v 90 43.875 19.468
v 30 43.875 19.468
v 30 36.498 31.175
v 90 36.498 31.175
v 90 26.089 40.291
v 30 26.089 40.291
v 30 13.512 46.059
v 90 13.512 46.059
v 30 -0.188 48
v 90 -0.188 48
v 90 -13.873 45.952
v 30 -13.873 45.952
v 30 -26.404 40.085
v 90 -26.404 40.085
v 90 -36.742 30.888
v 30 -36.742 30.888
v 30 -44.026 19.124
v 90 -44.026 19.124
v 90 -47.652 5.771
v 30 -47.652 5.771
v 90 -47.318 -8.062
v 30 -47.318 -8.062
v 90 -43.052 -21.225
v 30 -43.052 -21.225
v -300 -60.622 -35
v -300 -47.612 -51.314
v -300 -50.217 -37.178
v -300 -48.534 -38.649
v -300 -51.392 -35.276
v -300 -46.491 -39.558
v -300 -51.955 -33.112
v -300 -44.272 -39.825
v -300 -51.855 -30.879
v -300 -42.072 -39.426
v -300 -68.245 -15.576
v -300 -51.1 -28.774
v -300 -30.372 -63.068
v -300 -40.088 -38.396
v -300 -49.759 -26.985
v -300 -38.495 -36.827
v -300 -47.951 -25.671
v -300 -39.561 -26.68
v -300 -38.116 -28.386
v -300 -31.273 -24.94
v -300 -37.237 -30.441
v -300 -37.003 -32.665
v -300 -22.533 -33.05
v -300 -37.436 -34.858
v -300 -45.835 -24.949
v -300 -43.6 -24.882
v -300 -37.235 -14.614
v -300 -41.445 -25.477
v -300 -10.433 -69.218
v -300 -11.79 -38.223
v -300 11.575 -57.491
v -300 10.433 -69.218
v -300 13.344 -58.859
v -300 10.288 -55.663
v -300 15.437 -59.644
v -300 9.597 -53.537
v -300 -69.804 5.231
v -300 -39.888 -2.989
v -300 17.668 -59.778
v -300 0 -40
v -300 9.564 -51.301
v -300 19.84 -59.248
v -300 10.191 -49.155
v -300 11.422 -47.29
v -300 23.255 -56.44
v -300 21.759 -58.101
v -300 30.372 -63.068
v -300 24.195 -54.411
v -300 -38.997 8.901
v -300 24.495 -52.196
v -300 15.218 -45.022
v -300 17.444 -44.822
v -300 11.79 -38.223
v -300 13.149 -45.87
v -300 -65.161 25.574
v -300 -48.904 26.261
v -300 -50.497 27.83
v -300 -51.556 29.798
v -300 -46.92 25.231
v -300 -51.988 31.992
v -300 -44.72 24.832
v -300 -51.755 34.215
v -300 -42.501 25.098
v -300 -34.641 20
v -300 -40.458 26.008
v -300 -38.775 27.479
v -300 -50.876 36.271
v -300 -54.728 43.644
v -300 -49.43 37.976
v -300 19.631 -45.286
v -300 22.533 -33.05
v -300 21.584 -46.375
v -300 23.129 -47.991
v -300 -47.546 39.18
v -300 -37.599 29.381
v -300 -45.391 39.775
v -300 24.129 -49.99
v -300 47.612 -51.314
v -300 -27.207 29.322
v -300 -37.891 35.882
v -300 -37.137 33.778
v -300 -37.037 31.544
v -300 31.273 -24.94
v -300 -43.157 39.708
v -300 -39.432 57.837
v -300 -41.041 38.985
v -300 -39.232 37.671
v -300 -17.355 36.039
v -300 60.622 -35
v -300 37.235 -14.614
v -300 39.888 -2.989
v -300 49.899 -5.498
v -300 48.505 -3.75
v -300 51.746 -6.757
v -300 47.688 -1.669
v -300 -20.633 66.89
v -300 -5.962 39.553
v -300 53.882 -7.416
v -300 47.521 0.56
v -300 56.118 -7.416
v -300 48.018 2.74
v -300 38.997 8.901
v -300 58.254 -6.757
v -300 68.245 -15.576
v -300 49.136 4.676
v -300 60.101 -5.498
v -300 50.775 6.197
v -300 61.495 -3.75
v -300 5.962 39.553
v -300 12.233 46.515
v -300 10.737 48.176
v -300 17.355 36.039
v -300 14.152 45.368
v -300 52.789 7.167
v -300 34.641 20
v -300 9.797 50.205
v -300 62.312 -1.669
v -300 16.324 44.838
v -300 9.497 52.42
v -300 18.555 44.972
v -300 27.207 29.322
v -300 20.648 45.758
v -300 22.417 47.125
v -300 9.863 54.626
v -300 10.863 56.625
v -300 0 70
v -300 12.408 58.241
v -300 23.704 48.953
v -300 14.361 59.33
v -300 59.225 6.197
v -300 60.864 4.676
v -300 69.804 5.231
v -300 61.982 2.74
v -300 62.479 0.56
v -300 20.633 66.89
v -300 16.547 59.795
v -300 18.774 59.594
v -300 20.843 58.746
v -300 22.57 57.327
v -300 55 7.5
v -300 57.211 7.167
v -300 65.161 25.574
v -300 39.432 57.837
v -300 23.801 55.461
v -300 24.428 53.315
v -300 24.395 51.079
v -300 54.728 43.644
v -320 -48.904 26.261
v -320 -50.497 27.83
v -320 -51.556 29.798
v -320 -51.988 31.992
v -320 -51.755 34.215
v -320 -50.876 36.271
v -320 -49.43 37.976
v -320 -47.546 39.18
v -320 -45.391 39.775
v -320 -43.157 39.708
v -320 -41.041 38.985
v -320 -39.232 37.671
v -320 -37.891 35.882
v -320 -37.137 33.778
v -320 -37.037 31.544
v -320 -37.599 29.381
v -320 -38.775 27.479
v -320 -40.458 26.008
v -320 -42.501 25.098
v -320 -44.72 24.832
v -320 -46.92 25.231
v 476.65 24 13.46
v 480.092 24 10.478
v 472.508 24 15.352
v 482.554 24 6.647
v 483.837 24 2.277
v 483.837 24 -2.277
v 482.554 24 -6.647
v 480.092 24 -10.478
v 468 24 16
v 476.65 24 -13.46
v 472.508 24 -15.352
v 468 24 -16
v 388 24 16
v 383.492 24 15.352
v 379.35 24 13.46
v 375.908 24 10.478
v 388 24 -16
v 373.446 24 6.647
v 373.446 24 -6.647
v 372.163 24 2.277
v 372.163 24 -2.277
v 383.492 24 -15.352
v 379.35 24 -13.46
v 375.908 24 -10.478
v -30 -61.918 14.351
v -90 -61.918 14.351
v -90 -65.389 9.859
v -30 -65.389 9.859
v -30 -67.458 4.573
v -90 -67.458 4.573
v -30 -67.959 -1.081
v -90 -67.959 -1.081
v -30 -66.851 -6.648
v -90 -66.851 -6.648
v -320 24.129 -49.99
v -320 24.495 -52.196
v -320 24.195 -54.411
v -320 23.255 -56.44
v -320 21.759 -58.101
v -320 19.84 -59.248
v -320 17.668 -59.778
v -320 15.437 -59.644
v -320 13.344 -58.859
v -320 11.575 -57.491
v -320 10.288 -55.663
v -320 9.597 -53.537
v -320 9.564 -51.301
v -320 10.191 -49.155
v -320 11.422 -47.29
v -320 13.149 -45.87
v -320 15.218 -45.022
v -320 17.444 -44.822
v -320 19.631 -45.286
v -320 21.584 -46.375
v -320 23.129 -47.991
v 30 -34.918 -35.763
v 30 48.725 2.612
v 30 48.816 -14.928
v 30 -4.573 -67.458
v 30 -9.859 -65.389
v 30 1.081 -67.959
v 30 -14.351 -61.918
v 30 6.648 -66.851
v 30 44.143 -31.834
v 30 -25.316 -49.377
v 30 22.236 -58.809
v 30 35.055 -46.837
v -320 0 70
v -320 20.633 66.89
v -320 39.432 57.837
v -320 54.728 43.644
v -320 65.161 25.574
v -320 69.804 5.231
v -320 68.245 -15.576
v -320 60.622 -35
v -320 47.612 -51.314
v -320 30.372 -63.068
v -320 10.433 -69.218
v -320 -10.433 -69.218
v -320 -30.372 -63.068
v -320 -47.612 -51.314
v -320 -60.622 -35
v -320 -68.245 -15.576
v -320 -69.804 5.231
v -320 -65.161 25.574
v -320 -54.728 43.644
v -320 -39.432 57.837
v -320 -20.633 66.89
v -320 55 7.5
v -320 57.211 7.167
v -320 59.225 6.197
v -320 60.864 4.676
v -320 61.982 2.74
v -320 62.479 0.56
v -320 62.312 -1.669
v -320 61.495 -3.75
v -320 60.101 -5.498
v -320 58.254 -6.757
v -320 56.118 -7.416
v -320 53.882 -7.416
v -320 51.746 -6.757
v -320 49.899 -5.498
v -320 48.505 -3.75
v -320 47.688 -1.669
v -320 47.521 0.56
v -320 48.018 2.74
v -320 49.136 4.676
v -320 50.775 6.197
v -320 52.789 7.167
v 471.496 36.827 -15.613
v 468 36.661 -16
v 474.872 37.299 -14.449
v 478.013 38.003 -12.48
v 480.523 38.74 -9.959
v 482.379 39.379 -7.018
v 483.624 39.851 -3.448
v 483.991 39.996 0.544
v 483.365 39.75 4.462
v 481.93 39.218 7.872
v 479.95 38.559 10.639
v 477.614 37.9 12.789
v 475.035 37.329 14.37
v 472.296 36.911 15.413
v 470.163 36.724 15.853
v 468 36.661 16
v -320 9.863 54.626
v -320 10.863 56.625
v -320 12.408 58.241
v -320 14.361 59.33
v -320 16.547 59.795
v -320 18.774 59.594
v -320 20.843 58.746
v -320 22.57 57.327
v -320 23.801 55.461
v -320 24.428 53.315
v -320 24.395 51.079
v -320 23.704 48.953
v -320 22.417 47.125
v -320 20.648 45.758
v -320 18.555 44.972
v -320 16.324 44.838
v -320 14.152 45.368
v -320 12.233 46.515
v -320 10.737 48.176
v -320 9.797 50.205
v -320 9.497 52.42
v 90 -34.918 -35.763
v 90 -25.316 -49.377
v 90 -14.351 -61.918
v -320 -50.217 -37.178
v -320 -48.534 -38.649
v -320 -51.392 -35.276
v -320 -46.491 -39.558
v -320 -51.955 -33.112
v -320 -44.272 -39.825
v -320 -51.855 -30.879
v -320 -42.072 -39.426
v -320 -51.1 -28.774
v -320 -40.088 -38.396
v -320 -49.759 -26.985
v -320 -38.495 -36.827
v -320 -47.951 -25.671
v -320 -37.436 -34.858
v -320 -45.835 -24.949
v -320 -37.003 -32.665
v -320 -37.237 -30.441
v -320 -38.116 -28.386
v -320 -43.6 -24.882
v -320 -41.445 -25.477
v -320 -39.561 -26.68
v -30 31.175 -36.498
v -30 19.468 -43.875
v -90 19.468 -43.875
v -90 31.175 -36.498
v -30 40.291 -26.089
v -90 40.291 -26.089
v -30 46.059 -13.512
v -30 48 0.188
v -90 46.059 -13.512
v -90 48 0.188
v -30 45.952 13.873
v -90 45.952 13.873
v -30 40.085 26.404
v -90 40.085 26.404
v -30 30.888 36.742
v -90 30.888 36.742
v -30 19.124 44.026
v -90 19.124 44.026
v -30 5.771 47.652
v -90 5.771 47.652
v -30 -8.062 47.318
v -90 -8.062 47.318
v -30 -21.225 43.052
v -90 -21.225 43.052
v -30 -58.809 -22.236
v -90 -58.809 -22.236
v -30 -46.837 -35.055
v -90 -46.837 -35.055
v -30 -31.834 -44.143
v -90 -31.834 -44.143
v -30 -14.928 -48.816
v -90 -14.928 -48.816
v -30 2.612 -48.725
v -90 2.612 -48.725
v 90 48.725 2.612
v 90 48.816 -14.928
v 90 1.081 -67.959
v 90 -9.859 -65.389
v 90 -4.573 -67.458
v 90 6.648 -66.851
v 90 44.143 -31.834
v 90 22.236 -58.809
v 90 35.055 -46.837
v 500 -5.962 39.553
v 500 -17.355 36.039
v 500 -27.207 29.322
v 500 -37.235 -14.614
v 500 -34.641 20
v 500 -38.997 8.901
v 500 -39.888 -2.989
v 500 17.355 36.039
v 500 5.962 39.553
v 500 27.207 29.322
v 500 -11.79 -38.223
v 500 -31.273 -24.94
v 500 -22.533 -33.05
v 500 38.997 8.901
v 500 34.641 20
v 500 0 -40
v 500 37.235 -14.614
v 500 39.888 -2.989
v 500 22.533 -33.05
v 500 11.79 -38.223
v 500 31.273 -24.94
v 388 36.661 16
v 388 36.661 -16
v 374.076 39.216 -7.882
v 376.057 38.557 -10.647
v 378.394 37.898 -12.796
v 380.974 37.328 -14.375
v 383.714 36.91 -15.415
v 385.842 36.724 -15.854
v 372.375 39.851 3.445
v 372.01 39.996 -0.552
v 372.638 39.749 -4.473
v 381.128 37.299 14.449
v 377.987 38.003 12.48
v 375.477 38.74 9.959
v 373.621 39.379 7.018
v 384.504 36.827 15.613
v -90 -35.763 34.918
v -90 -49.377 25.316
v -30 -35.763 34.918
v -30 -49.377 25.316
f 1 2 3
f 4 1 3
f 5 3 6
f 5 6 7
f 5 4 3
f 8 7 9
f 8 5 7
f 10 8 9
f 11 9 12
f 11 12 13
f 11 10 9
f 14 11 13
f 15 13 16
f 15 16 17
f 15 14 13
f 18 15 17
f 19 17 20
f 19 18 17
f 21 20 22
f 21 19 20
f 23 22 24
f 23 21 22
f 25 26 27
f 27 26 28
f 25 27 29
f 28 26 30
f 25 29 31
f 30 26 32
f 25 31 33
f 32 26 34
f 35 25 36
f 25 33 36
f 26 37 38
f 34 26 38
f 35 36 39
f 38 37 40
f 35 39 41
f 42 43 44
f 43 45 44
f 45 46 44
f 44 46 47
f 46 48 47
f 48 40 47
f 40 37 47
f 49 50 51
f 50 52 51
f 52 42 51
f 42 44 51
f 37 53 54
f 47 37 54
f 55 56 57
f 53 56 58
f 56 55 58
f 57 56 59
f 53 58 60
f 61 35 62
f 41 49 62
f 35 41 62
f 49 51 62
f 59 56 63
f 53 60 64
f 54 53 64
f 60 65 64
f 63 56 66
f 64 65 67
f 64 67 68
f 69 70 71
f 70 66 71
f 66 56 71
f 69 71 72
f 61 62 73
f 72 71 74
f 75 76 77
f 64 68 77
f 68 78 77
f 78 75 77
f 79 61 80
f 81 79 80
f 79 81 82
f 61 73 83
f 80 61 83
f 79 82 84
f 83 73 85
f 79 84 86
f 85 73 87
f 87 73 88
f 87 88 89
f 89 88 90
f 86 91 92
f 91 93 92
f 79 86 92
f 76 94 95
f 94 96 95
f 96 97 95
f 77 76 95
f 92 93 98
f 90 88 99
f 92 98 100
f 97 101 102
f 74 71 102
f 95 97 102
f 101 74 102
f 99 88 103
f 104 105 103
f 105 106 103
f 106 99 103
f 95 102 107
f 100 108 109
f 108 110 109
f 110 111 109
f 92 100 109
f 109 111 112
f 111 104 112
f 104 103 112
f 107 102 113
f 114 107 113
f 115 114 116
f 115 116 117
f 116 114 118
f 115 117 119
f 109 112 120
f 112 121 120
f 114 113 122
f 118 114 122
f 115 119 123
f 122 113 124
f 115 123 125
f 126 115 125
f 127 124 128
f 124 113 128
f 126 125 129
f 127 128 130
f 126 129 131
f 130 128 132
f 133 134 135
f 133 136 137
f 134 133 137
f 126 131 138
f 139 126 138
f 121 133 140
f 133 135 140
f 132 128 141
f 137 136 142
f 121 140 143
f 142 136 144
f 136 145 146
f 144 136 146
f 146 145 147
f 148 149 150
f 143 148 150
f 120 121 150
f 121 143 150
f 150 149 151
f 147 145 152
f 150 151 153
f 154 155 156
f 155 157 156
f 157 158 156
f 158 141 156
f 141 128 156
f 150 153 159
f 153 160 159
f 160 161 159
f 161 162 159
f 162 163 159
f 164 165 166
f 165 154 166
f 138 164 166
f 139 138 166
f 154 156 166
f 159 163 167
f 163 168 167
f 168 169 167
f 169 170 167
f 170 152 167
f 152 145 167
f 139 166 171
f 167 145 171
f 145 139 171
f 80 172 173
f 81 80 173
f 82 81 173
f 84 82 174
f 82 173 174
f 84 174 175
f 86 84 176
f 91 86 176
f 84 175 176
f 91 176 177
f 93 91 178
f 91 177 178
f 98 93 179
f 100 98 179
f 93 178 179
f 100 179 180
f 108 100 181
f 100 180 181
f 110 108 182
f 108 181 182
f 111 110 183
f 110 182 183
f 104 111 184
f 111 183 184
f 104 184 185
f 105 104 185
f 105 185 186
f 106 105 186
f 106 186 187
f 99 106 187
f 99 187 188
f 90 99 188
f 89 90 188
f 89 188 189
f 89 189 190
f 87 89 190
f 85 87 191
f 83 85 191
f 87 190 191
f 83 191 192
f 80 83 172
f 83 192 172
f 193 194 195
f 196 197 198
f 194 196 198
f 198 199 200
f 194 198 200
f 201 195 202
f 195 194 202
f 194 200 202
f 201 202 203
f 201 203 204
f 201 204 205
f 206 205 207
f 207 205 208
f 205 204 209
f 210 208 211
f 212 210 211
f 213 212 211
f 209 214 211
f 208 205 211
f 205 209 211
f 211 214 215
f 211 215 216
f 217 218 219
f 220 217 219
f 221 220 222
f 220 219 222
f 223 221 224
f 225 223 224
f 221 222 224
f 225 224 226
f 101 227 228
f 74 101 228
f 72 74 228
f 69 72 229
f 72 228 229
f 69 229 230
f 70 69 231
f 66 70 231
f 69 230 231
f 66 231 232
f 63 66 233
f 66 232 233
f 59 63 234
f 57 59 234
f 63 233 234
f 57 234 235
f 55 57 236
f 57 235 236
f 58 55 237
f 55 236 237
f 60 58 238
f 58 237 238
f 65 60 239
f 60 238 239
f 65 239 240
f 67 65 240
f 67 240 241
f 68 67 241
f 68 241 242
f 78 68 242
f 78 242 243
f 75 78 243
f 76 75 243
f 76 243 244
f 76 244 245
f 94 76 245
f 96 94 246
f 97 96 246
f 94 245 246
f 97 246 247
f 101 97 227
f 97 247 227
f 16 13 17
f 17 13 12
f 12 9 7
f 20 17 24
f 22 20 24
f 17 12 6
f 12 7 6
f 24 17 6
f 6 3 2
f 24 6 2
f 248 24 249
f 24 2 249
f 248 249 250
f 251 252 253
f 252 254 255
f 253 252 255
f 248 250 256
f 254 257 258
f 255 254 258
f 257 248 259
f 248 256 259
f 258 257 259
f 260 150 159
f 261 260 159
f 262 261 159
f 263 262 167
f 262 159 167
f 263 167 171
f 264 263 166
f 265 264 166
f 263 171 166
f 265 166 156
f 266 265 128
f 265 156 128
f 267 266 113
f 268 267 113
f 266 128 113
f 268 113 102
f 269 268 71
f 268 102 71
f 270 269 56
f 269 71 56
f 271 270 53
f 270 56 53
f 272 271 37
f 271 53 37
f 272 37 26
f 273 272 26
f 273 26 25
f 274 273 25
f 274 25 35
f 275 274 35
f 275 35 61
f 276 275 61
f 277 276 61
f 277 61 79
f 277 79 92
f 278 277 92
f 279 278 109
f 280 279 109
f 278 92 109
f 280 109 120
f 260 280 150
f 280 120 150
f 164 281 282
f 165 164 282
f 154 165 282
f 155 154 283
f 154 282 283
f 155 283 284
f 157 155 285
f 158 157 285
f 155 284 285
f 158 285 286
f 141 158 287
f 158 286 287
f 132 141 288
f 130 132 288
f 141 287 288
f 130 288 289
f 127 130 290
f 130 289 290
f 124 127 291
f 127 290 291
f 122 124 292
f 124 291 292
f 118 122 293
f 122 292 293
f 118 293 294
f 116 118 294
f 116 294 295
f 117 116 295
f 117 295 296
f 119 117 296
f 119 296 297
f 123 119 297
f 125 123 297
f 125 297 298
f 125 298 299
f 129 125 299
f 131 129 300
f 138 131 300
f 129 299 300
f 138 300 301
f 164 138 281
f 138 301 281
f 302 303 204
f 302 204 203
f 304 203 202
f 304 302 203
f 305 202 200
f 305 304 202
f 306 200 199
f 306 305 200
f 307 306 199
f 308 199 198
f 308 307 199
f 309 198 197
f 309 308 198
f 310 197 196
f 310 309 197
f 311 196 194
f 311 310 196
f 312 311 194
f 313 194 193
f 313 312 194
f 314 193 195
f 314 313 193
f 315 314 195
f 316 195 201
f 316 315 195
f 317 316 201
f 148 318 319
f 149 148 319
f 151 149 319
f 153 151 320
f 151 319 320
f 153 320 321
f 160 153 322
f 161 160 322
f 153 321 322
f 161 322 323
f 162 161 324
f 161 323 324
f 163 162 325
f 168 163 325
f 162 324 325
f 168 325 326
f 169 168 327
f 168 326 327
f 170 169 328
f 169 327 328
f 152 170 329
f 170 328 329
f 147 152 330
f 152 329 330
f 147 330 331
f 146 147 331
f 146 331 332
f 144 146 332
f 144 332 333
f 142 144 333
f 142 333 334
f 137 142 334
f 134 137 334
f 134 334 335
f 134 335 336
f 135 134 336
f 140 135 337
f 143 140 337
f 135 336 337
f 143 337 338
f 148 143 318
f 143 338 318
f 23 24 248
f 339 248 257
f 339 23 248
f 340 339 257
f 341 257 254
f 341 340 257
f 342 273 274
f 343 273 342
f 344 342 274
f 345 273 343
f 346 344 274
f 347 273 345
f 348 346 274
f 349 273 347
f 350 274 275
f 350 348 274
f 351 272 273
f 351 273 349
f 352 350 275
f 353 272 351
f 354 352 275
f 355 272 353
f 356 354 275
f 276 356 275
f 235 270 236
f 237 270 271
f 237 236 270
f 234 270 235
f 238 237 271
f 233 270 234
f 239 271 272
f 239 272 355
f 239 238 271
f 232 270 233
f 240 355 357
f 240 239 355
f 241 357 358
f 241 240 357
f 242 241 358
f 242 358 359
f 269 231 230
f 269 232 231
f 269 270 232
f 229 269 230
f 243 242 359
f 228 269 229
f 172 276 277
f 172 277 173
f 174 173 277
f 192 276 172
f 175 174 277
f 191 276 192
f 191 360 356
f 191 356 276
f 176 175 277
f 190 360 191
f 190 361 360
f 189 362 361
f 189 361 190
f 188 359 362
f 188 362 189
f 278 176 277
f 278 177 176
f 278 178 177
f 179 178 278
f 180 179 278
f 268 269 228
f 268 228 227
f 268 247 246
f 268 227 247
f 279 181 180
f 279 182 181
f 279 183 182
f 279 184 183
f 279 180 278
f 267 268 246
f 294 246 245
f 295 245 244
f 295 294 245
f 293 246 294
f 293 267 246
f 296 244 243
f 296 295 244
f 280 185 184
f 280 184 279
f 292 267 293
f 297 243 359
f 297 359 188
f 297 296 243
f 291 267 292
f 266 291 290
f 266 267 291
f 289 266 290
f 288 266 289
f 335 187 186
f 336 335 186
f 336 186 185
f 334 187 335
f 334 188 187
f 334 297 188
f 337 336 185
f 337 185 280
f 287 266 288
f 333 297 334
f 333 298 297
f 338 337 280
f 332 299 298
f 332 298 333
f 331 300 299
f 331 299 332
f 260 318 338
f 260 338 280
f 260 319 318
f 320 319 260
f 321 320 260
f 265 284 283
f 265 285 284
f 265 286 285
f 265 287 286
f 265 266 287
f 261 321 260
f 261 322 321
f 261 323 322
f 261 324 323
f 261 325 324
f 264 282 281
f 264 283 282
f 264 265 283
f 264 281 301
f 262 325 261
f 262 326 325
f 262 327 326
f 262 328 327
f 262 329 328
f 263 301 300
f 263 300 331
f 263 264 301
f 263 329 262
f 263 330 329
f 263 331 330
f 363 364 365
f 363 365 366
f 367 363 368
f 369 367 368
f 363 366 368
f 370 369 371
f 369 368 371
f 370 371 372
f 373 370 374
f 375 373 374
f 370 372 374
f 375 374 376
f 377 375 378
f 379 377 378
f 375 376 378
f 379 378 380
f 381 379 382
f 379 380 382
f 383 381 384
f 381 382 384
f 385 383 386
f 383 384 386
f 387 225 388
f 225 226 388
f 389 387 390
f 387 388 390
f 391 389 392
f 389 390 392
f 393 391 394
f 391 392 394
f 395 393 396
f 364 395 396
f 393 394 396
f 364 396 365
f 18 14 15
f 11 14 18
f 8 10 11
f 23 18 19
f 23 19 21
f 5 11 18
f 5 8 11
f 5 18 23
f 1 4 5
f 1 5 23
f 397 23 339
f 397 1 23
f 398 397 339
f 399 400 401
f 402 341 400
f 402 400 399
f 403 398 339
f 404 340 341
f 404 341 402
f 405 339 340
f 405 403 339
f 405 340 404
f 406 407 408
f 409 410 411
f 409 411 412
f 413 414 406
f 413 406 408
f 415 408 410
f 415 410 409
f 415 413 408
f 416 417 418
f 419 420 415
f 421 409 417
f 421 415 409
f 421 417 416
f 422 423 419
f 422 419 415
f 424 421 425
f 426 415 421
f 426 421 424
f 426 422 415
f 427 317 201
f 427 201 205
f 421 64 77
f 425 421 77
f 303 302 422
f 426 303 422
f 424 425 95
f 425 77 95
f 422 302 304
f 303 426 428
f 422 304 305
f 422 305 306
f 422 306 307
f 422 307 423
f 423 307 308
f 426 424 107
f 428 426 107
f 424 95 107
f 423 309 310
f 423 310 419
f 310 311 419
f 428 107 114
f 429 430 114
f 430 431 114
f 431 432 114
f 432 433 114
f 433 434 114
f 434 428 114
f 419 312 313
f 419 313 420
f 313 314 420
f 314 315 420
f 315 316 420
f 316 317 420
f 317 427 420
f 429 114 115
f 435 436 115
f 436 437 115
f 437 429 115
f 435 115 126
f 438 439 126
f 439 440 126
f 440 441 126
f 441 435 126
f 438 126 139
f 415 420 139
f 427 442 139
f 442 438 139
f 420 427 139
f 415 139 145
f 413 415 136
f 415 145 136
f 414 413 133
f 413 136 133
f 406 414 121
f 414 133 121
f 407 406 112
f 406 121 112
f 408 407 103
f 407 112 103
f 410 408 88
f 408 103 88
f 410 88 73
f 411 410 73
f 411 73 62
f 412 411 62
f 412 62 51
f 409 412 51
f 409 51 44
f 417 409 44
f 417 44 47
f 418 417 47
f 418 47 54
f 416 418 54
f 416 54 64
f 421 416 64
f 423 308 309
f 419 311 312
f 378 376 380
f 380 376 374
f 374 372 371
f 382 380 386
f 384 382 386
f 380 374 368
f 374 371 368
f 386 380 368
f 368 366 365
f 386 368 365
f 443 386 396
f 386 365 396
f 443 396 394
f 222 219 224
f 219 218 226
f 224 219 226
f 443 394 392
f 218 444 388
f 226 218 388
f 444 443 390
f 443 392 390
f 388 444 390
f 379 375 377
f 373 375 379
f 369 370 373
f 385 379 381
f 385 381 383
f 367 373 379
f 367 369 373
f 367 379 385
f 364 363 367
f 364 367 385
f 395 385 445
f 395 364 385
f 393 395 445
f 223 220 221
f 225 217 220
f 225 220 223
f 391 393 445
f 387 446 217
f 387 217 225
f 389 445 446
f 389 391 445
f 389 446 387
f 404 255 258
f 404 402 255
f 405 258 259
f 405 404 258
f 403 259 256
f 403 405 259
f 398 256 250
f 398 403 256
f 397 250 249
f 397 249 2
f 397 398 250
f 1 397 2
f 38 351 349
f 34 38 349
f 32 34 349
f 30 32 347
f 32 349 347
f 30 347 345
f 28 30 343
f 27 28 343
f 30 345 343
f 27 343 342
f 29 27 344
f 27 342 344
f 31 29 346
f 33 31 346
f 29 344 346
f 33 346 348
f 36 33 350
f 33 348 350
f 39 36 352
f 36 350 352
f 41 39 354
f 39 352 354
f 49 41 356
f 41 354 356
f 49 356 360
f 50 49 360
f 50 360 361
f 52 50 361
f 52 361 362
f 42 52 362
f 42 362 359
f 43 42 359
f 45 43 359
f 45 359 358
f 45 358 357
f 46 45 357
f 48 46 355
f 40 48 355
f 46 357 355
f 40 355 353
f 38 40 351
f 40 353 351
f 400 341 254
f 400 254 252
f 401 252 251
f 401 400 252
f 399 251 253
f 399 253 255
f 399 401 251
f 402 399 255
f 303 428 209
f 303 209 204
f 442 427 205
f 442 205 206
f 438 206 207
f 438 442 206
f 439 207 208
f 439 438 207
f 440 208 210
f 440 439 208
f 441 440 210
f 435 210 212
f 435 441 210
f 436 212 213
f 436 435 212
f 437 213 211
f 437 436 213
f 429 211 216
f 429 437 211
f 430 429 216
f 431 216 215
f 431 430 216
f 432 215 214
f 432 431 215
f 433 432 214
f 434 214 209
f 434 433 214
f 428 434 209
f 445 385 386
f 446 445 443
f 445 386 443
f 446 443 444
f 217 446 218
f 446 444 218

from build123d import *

# Parameters (mm, degrees)
BOSS_EXTRUDE1_DEPTH      = 500
BOSS_EXTRUDE1_DEPTH_BACK = 300
SKETCH1_R                = 40
BOSS_EXTRUDE2_START      = 60
BOSS_EXTRUDE2_DEPTH      = 30
BODY_MOVE_COPY1_ANGLE    = 90
CUT_EXTRUDE1_DEPTH       = 16
SKETCH5_R                = 70
BOSS_EXTRUDE3_DEPTH      = 20
SKETCH6_R                = 7.5
CUT_EXTRUDE2_DEPTH       = 20
CIRPATTERN1_COUNT        = 5


with BuildPart() as part:
    # Sketch1 → Boss-Extrude1 (new, two sides: drawn at the far end of the back side and taken through both)
    with BuildSketch(Plane(origin=(0, 0, 0), x_dir=(0, 0, -1), z_dir=(1, 0, 0)).offset(-BOSS_EXTRUDE1_DEPTH_BACK)):
        Circle(SKETCH1_R)
    extrude(amount=BOSS_EXTRUDE1_DEPTH + BOSS_EXTRUDE1_DEPTH_BACK)

    # Sketch4 → Cut-Extrude1 (cut)
    with BuildSketch(Plane(origin=(0, 40, 0), x_dir=(1, 0, 0), z_dir=(0, 1, 0))):
        with BuildLine():
            Line((388, 16), (468, 16))
            ThreePointArc((468, 16), (484, 0), (468, -16))
            Line((468, -16), (388, -16))
            ThreePointArc((388, -16), (372, 0), (388, 16))
        make_face()
    extrude(amount=-CUT_EXTRUDE1_DEPTH, mode=Mode.SUBTRACT)

    # Sketch5 → Boss-Extrude3 (add)
    with BuildSketch(Plane.ZY.offset(300)):
        Circle(SKETCH5_R)
    extrude(amount=BOSS_EXTRUDE3_DEPTH)

    # Sketch6 → Cut-Extrude2 (cut)
    with BuildSketch(Plane.ZY.offset(320)):
        with Locations((0, 55)):
            Circle(SKETCH6_R)
    cut_extrude2 = extrude(amount=-CUT_EXTRUDE2_DEPTH, mode=Mode.SUBTRACT)

    # CirPattern1: Cut-Extrude2 ×5 about axis
    cirpattern1_axis = Axis((0, 0, 0), (1, 0, 0))
    for i in range(1, CIRPATTERN1_COUNT):
        add(cut_extrude2.rotate(cirpattern1_axis, i * 360 / CIRPATTERN1_COUNT), mode=Mode.SUBTRACT)


with BuildPart() as body_2:
    # Sketch2 → Boss-Extrude2 (new, symmetric)
    with BuildSketch(Plane(origin=(0, 0, 0), x_dir=(0, 0, -1), z_dir=(1, 0, 0)).offset(BOSS_EXTRUDE2_START)):
        with BuildLine():
            ThreePointArc((-19.468358274, 43.874628501), (-43.472353382, -20.350786015), (21.224906467, -43.052332637))
            ThreePointArc((21.224906467, -43.052332637), (42.694979911, -30.29437767), (61.918171208, -14.350777546))
            ThreePointArc((61.918171208, -14.350777546), (67.457858752, -4.573499044), (66.850688147, 6.647670985))
            ThreePointArc((66.850688147, 6.647670985), (31.834284447, 44.142797827), (-19.468358274, 43.874628501))
        make_face()
    extrude(amount=BOSS_EXTRUDE2_DEPTH, both=True)


with BuildPart() as body_3:
    # Mirror3: mirrored copy
    add(body_2.part.mirror(Plane(origin=(0, 0, 0), x_dir=(0, 0, 1), z_dir=(1, 0, 0))))


with BuildPart() as body_3_1:
    # Body-Move/Copy1: moved
    add(body_3.part.rotate(Axis((0, 0, 0), (-1, 0, 0)), BODY_MOVE_COPY1_ANGLE))


solid = Compound([part.part, body_2.part, body_3_1.part])
